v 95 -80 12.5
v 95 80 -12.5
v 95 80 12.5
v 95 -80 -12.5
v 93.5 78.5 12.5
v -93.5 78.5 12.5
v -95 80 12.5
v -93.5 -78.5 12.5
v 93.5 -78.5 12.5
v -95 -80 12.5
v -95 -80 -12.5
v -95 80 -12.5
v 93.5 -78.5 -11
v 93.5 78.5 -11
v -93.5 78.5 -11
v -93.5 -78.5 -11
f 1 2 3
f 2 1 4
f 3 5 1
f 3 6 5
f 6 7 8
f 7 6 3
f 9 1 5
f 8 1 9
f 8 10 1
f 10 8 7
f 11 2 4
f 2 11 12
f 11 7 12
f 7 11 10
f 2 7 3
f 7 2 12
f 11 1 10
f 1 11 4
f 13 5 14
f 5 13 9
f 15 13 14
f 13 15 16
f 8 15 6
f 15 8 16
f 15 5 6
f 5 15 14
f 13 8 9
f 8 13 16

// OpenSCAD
// ========================================
// a 190 x 160 x 25 mm enclosure with 1.5 mm wall thickness
// NeuroCAD canonical IR; dimensions are millimetres
// ========================================
$fn = 48;

difference() {
  cube(size=[190, 160, 25], center=true);
  translate([0, 0, 0.85]) {
    cube(size=[187, 157, 23.7], center=true);
  }
}
